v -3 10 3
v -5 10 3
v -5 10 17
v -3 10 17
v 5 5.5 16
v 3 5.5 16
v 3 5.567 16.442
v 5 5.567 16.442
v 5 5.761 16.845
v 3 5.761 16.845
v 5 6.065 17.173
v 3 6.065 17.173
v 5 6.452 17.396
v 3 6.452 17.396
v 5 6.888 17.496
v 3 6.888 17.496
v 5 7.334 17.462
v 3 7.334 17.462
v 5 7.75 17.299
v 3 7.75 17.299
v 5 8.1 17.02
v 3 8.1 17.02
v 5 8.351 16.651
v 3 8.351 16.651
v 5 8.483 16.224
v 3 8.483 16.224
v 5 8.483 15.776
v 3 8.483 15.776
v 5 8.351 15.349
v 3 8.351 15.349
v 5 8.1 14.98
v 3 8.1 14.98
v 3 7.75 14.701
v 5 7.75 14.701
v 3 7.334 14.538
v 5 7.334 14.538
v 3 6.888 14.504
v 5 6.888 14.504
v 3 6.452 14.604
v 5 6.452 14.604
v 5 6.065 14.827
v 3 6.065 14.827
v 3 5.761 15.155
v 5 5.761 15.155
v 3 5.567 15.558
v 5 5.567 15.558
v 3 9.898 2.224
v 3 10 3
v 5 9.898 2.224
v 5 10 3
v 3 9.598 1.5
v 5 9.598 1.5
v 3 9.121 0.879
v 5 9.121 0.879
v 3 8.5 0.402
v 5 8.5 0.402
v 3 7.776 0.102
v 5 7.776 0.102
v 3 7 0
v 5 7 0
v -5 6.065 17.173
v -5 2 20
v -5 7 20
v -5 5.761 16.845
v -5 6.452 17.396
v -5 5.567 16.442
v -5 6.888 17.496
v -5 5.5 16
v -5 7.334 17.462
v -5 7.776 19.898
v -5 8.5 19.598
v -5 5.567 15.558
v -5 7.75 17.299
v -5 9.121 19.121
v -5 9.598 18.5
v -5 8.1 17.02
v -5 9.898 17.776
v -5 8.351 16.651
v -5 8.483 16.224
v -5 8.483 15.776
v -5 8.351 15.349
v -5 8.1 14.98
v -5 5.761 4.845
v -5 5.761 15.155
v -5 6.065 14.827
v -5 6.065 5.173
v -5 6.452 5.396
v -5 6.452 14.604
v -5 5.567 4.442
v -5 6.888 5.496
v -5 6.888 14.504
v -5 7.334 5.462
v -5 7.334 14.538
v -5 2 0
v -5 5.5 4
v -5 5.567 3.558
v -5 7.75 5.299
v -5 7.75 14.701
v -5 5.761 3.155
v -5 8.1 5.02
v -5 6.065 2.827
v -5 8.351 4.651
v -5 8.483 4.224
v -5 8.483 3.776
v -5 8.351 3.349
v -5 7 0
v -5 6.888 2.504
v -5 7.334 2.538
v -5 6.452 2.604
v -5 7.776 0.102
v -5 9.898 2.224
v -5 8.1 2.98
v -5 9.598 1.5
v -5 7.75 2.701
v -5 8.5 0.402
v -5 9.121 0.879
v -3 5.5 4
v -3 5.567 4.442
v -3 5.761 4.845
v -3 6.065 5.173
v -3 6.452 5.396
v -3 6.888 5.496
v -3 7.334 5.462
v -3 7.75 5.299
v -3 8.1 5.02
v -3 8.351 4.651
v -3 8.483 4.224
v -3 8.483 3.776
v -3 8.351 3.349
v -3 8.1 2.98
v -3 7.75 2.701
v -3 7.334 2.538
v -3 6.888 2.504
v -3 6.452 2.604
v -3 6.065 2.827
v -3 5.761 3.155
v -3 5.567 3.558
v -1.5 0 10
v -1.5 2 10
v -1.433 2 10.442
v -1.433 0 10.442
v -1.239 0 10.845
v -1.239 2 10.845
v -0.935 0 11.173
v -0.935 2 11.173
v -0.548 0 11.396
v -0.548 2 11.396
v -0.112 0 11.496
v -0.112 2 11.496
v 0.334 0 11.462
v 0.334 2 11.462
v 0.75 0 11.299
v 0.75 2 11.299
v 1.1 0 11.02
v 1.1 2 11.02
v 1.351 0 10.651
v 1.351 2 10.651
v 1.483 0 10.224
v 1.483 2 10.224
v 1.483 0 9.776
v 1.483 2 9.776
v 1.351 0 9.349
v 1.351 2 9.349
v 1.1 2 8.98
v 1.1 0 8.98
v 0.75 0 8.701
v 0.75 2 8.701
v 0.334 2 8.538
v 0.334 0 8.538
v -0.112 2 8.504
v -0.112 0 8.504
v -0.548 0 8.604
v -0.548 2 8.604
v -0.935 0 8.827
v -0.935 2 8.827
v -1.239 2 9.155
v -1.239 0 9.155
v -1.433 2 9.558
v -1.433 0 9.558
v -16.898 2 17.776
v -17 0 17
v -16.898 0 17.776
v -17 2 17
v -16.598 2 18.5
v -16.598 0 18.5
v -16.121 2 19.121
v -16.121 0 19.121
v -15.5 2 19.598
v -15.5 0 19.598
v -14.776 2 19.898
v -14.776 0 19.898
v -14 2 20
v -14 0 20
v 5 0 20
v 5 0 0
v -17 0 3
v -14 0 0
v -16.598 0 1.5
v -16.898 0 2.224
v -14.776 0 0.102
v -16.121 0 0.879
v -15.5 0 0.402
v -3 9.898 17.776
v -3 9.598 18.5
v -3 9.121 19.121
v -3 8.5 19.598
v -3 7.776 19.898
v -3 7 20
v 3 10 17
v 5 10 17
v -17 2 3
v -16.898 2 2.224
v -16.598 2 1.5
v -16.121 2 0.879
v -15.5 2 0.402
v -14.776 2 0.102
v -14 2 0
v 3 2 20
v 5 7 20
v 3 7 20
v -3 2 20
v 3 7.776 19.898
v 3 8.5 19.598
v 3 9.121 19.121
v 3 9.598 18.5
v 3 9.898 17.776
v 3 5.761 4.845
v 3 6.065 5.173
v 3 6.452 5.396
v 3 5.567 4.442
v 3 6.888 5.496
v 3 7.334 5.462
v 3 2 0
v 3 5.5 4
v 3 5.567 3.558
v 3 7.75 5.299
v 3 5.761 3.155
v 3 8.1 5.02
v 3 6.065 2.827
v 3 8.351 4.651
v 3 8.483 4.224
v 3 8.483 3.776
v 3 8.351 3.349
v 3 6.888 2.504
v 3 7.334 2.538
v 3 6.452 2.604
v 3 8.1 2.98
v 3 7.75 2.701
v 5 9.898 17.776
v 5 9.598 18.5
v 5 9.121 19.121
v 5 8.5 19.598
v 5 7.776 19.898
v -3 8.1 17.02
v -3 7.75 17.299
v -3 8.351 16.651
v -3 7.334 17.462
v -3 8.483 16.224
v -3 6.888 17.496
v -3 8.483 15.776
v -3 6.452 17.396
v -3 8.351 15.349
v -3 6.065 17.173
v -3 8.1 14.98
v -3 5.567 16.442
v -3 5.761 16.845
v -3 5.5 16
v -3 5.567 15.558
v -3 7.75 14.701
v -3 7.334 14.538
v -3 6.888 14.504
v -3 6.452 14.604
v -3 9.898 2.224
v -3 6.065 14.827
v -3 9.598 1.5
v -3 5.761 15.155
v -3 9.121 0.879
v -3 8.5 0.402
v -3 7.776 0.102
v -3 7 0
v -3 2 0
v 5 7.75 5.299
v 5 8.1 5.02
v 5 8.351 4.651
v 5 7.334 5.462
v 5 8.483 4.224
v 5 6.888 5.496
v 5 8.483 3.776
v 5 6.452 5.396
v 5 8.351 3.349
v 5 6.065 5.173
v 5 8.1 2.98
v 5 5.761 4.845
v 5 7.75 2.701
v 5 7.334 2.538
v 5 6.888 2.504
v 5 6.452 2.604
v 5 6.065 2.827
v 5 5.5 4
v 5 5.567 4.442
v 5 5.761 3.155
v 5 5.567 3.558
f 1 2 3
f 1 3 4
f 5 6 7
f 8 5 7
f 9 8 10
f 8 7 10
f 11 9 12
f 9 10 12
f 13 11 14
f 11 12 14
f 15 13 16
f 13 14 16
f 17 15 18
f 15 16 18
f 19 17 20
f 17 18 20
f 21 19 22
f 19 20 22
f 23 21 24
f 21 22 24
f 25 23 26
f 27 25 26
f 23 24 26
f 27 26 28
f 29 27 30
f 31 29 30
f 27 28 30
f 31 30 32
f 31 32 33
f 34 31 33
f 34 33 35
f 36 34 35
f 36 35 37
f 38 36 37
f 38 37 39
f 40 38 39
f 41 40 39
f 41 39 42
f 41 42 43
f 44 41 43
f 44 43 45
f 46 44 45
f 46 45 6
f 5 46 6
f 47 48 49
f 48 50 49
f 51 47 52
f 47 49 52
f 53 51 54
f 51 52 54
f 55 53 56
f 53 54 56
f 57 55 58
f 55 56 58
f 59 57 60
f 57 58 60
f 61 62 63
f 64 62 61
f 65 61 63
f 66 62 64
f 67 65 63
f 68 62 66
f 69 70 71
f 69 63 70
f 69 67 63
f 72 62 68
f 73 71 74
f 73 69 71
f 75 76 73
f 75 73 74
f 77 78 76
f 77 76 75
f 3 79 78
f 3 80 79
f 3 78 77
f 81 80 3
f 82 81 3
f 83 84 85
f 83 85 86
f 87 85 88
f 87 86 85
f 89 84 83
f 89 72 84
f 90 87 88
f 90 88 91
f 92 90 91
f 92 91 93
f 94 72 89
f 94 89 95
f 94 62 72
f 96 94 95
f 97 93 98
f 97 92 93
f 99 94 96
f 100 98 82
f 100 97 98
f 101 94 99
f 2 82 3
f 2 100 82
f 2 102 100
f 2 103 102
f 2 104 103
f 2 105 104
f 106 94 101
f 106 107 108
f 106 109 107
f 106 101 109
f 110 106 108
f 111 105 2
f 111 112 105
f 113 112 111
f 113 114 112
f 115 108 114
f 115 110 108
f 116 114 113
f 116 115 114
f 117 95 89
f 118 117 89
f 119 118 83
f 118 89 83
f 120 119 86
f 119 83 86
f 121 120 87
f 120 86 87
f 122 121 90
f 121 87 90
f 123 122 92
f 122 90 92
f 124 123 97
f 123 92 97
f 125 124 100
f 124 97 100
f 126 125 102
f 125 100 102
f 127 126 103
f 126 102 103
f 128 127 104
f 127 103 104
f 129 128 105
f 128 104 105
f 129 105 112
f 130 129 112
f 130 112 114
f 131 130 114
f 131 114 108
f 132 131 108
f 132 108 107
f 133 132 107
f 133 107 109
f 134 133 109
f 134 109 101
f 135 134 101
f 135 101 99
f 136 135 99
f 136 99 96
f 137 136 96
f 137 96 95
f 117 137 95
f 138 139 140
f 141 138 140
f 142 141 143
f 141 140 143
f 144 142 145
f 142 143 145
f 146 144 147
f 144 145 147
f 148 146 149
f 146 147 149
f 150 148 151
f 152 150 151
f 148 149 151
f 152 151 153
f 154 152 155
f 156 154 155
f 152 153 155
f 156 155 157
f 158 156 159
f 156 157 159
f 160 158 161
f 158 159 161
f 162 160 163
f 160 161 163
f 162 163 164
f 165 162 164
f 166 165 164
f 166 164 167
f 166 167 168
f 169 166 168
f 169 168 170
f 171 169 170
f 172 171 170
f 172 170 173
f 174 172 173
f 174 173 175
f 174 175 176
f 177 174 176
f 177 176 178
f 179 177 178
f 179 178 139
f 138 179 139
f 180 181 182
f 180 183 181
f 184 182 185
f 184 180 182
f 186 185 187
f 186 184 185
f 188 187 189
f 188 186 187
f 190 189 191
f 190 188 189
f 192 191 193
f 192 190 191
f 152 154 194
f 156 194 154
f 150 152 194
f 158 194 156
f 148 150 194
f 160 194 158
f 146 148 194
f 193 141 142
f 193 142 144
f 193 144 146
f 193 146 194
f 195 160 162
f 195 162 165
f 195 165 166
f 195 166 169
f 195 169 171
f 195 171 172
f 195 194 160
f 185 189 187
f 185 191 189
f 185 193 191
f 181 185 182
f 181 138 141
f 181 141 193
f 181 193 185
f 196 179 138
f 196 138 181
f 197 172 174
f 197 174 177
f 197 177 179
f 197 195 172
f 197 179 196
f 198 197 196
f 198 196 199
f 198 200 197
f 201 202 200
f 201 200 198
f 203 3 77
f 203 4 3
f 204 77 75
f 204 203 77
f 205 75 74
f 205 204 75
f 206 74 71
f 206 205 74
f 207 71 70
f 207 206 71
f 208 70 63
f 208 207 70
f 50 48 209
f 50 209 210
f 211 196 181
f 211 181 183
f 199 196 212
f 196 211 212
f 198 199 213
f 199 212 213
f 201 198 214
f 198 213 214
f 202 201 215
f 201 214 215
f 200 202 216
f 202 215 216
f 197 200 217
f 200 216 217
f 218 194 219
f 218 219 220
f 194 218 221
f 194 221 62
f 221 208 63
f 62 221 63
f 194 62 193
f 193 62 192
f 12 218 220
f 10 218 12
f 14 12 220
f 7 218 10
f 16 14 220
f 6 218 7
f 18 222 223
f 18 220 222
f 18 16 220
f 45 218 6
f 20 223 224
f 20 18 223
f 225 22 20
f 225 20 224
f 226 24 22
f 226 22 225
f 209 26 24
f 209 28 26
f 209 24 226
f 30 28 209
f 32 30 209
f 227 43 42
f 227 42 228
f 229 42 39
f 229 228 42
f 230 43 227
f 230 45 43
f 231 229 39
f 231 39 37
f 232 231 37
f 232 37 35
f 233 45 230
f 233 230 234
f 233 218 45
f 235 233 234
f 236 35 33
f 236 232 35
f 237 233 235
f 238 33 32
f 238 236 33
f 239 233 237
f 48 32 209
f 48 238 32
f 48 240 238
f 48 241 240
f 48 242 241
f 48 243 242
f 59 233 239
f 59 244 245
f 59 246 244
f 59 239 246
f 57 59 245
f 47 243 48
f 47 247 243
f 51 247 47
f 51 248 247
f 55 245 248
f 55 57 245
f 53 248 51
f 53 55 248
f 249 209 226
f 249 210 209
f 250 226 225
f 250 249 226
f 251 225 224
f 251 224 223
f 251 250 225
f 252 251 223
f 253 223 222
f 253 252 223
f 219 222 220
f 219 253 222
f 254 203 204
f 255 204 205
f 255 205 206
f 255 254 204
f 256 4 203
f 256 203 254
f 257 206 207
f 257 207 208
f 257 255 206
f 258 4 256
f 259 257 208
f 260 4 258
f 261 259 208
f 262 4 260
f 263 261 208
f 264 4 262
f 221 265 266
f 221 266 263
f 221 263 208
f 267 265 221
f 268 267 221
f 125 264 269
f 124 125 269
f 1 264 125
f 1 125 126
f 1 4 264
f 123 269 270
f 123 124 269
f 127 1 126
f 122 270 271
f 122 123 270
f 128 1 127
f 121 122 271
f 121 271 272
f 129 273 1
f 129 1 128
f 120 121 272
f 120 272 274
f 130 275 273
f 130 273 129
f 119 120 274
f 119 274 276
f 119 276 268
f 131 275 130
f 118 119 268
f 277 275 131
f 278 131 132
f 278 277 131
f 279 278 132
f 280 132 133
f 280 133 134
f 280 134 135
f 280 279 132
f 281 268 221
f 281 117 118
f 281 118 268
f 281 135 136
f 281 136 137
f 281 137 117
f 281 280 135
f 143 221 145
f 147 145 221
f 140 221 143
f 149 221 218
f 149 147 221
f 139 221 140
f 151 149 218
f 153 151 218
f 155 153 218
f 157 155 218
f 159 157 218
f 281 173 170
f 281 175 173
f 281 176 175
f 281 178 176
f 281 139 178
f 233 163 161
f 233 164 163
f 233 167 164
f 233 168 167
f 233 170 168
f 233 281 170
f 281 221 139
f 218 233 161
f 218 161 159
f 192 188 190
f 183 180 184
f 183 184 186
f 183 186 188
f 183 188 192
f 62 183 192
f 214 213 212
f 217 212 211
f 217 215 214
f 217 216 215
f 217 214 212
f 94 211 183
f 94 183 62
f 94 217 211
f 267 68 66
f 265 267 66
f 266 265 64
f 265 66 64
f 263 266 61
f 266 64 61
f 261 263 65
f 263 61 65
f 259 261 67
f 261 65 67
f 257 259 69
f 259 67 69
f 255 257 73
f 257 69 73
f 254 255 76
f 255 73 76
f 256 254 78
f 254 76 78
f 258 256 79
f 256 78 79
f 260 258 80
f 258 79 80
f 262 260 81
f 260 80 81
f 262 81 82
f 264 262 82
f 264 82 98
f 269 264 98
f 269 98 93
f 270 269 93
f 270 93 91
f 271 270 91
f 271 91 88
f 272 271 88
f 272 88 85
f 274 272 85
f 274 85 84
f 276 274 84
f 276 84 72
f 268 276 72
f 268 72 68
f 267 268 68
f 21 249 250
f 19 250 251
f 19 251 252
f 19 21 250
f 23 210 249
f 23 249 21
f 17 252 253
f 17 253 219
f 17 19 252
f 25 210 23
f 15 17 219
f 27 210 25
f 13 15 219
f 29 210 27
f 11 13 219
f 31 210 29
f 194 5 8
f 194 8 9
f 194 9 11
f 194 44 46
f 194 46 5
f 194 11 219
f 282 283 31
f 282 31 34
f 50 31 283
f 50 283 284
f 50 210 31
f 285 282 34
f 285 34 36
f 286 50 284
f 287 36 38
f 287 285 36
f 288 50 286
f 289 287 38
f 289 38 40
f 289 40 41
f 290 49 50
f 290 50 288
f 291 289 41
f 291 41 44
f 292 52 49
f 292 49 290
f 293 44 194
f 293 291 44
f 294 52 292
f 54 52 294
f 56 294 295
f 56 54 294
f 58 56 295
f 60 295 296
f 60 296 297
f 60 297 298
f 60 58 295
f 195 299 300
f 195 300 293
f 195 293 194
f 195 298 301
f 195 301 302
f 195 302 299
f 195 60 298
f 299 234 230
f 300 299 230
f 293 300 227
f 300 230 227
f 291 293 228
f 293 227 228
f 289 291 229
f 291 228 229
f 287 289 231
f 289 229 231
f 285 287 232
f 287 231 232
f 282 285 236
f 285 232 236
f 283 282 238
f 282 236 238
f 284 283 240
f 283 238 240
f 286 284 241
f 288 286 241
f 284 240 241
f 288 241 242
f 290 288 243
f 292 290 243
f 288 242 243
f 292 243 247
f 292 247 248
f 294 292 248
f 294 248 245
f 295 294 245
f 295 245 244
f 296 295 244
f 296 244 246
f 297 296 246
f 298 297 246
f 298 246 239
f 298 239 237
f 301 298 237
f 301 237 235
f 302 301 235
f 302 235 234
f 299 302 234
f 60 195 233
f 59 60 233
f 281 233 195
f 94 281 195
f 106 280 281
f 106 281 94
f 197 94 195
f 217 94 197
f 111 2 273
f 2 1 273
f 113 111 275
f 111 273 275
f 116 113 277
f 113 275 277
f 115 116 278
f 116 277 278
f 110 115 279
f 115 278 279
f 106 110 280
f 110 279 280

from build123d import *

# Parameters (mm, degrees)
BOSS_EXTRUDE1_DEPTH = 20
FILLET1_R           = 3
SKETCH2_R           = 1.5
CUT_EXTRUDE1_DEPTH  = 20
SKETCH3_R           = 1.5
CUT_EXTRUDE2_DEPTH  = 20


with BuildPart() as part:
    # Sketch1 → Boss-Extrude1 (new body)
    with BuildSketch(Plane.XY):
        Polygon((5, 0), (-17, 0), (-17, 2), (-5, 2), (-5, 10), (-3, 10), (-3, 2), (3, 2), (3, 10), (5, 10), align=None)
    extrude(amount=BOSS_EXTRUDE1_DEPTH)

    # Fillet1
    fillet1_edges = [part.edges().sort_by_distance(p)[0] for p in [
        (4, 10, 0),
        (-17, 1, 0),
        (-4, 10, 0),
        (-4, 10, 20),
        (-17, 1, 20),
        (4, 10, 20),
    ]]
    fillet(fillet1_edges, radius=FILLET1_R)

    # Sketch2 → Cut-Extrude1 (cut)
    with BuildSketch(Plane.ZY.offset(5)):
        with Locations(Location((16, 7, 0), (0, 0, 270))):
            Circle(SKETCH2_R)
        with Locations(Location((4, 7, 0), (0, 0, 270))):
            Circle(SKETCH2_R)
    extrude(amount=-CUT_EXTRUDE1_DEPTH, mode=Mode.SUBTRACT)

    # Sketch3 → Cut-Extrude2 (cut)
    with BuildSketch(Plane(origin=(0, 2, 0), x_dir=(1, 0, 0), z_dir=(0, 1, 0))):
        with Locations(Location((0, -10, 0), (0, 0, 180))):
            Circle(SKETCH3_R)
    extrude(amount=-CUT_EXTRUDE2_DEPTH, mode=Mode.SUBTRACT)


solid = part.part
